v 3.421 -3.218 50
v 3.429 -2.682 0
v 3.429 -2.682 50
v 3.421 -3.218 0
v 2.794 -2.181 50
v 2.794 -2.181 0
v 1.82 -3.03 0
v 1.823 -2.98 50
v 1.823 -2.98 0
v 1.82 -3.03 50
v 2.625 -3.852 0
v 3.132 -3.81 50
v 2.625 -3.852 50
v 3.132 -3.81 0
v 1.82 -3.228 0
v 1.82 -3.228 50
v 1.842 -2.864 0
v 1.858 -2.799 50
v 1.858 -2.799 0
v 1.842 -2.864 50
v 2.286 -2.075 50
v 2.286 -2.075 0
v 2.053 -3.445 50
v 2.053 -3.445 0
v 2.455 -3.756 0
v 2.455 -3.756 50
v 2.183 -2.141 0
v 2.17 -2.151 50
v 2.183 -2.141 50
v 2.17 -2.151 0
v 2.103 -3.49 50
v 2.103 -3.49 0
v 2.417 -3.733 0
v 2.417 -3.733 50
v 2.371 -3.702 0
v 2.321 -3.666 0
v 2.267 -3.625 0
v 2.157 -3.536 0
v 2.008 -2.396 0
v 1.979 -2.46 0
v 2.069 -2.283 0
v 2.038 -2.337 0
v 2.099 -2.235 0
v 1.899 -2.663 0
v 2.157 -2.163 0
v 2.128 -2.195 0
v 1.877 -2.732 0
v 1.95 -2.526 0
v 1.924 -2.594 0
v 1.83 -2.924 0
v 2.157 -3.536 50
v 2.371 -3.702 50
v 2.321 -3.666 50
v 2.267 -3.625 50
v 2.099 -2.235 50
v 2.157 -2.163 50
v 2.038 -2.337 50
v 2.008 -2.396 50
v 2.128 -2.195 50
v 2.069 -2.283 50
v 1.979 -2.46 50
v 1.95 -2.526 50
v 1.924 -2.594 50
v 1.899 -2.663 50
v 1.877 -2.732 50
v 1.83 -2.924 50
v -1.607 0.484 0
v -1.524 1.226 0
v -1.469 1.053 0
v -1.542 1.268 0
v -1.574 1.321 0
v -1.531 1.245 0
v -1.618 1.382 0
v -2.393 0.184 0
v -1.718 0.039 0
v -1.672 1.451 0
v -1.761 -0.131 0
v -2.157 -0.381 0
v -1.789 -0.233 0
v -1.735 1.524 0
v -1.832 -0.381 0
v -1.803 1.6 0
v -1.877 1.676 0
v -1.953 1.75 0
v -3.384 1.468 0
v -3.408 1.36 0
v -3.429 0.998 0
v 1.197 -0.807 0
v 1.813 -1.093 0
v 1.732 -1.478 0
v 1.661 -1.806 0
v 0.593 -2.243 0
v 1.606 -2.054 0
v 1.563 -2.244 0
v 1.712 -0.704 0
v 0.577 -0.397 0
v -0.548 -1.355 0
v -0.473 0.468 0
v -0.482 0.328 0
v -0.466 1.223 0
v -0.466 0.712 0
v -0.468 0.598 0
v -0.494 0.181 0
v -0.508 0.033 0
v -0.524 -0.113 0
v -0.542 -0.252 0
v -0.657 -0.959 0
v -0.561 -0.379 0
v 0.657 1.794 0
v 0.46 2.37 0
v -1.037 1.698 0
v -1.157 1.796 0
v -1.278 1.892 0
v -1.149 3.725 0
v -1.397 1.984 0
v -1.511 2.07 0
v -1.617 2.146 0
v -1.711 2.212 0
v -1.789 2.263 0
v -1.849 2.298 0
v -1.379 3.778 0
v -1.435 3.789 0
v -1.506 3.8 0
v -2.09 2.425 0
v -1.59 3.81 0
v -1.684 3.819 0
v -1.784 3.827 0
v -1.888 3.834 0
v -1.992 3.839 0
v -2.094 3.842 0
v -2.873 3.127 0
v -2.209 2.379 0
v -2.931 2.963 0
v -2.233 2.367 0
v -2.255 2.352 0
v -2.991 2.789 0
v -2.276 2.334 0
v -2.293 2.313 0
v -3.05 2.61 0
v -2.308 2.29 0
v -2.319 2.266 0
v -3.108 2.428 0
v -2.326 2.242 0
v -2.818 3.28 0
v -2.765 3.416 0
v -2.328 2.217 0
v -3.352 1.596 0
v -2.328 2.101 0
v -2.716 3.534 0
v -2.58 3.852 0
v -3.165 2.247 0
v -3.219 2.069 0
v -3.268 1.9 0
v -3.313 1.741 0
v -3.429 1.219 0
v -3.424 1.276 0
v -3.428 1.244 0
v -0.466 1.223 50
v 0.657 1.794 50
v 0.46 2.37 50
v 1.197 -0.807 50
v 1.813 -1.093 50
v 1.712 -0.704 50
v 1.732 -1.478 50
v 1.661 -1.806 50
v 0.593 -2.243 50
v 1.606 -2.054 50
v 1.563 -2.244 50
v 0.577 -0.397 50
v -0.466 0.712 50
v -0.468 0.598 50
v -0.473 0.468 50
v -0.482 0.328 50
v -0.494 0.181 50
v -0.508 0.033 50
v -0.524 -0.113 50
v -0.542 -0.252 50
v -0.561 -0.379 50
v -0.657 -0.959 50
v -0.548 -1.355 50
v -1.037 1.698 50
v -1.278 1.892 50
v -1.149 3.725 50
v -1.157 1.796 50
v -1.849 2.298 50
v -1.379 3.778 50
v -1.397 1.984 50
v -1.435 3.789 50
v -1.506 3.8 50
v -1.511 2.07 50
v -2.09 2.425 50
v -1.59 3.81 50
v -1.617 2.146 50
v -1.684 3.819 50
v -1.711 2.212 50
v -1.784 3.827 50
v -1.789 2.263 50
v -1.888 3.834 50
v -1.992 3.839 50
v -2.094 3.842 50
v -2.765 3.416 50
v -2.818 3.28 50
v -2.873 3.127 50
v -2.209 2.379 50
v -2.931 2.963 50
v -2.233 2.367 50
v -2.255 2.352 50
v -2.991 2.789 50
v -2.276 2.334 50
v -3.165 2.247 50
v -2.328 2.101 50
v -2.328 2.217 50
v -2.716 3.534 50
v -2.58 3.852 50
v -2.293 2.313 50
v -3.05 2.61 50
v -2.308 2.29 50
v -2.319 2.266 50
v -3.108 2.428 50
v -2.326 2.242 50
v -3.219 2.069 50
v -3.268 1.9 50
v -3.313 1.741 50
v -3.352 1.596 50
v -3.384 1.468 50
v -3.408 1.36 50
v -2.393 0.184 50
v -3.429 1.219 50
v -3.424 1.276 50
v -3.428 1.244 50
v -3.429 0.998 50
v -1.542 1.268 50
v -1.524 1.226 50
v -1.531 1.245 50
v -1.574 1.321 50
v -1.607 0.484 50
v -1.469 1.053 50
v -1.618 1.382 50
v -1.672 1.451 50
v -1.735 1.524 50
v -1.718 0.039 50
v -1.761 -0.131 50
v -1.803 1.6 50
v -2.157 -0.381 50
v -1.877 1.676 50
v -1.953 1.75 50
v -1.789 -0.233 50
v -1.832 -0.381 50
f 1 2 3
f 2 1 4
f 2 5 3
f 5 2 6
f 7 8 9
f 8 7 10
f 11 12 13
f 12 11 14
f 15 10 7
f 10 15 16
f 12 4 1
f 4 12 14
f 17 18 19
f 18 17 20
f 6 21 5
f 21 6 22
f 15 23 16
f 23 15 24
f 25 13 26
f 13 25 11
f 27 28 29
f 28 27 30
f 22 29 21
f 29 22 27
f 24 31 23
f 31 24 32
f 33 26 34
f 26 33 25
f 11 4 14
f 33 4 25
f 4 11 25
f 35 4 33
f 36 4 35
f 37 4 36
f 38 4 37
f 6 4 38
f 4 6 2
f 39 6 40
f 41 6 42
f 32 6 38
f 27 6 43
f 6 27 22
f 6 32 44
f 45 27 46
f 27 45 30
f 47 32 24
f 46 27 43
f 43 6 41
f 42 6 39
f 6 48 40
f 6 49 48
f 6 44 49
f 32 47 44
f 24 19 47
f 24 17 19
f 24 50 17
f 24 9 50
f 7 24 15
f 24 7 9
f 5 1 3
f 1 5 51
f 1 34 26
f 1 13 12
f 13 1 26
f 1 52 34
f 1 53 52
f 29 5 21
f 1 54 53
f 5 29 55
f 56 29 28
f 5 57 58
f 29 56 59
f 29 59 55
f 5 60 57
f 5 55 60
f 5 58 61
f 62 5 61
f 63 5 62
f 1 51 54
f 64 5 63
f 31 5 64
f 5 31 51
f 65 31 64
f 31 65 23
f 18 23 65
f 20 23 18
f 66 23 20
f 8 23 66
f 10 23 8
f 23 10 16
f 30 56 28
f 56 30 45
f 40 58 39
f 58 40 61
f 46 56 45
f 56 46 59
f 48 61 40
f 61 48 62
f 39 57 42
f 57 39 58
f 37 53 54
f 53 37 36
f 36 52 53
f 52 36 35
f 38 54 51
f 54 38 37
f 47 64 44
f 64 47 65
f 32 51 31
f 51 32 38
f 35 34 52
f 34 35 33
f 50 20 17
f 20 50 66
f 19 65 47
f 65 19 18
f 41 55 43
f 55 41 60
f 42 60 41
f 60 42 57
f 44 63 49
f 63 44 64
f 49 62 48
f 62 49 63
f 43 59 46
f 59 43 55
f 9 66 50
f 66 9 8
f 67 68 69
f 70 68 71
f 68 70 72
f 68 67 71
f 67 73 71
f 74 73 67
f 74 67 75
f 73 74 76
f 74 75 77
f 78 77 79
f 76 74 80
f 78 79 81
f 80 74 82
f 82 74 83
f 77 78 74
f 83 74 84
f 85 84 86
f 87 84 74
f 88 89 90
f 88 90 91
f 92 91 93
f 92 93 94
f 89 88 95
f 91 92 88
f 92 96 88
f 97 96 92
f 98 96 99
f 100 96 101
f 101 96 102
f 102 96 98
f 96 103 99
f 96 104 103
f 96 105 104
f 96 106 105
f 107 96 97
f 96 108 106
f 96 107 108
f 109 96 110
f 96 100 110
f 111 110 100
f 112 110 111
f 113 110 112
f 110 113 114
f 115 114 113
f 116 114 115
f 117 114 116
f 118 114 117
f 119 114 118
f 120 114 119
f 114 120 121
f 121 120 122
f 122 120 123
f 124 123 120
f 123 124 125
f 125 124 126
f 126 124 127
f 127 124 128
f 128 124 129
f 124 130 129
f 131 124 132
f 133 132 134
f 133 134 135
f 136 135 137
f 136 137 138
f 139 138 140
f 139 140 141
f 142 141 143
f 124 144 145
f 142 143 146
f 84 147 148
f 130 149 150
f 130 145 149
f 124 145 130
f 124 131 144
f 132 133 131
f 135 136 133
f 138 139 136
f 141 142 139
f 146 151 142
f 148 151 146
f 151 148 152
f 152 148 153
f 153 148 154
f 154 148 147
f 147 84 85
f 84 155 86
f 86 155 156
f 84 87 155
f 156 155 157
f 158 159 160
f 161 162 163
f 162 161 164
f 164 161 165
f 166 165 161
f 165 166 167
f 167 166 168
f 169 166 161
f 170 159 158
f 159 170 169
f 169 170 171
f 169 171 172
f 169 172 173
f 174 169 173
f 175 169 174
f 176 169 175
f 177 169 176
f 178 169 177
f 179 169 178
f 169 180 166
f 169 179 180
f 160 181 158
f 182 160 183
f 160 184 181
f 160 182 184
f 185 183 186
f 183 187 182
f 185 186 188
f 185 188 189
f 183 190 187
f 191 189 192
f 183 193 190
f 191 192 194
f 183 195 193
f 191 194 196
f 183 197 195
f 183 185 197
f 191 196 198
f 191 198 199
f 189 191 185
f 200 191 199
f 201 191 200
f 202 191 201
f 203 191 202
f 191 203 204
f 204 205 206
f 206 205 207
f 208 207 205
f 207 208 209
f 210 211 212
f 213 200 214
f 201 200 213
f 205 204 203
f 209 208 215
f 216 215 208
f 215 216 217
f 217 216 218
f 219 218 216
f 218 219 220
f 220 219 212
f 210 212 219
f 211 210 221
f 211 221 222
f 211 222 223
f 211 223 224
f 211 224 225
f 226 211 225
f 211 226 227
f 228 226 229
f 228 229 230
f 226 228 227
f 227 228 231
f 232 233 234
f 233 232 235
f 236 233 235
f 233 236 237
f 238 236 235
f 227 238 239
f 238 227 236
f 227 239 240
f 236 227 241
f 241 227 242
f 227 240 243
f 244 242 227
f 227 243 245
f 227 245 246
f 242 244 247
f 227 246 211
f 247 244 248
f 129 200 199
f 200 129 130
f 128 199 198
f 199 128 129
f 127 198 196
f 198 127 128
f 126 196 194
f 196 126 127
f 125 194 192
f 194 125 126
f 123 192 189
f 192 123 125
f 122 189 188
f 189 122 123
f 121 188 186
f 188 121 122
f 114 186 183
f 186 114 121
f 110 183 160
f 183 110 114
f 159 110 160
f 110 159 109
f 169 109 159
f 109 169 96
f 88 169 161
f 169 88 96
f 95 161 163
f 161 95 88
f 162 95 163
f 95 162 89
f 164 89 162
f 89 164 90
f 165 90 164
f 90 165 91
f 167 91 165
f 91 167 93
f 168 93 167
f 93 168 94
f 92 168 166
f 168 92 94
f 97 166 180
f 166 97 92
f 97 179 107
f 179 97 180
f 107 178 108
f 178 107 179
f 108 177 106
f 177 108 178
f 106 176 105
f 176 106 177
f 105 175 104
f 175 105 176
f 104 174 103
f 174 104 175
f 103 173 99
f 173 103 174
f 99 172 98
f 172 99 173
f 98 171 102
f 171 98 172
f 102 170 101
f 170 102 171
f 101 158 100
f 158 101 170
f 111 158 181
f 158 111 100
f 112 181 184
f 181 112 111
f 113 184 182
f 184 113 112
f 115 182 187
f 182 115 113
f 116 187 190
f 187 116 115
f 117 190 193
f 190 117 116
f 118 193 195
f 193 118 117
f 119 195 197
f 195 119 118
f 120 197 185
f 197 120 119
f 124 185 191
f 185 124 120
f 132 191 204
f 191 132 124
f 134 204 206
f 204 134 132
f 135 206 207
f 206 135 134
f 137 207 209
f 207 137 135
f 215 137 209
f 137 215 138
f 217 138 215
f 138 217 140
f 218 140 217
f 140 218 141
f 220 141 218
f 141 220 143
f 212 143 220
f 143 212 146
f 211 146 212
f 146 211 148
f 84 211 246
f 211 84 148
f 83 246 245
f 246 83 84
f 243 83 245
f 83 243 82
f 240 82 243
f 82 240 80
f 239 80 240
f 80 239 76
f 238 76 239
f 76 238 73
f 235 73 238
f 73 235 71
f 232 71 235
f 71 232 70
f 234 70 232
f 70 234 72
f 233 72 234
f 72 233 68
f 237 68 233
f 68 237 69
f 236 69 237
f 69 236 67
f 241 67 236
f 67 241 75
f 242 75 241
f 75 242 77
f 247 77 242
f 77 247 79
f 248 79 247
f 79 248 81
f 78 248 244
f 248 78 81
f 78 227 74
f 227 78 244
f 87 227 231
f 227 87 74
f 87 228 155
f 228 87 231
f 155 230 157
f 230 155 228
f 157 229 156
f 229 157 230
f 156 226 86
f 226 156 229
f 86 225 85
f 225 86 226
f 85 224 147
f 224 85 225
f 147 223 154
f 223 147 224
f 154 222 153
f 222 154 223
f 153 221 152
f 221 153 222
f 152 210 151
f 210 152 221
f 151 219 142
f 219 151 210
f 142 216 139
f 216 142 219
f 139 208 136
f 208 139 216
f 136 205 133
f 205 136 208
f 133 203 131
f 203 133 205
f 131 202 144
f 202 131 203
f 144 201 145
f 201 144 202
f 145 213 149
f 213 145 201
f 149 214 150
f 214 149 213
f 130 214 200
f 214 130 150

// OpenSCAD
// Generated by inkscape None + inkscape-paths2openscad 0.27
// Sat Sep 26 10:11:22 2020 from "inkscape.svg"

// Module names are of the form poly_<inkscape-path-id>().  As a result,
// you can associate a polygon in this OpenSCAD program with the corresponding
// SVG element in the Inkscape document by looking for the XML element with
// the attribute id="inkscape-path-id".

// fudge value is used to ensure that subtracted solids are a tad taller
// in the z dimension than the polygon being subtracted from.  This helps
// keep the resulting .stl file manifold.
fudge = 0.1;
user_unit_scale_x = 1.0;
user_unit_scale_y = 1.0;
custom_scale_x = 1;
custom_scale_y = 1;
zsize = 50;
line_fn = 16;
min_line_width = 1.0;
line_width_scale = 1.0;
function min_line_mm(w) = max(min_line_width, w * line_width_scale) * 1;


path957_0_center = [2.624667,2.963491];
path957_0_points = [[2.455333,3.756336],[2.416566,3.732715],[2.371214,3.702156],[2.320924,3.665934],[2.267348,3.625328],[2.156934,3.536069],[2.103394,3.489970],[2.053167,3.444596],[1.820333,3.228426],[1.820333,3.029876],[1.822902,2.980118],[1.830301,2.924337],[1.842070,2.863659],[1.857750,2.799210],[1.876880,2.732114],[1.899000,2.663498],[1.923651,2.594487],[1.950372,2.526208],[1.978702,2.459786],[2.008183,2.396346],[2.038353,2.337015],[2.068753,2.282918],[2.098923,2.235180],[2.128403,2.194929],[2.156732,2.163289],[2.170322,2.151050],[2.183451,2.141386],[2.286000,2.075086],[2.540000,2.127986],[2.794000,2.180886],[3.111500,2.431306],[3.429000,2.681716],[3.424900,2.949776],[3.420800,3.217826],[3.276451,3.514156],[3.132103,3.810496],[2.878351,3.831196],[2.624600,3.851896],[2.455266,3.756296],[2.455333,3.756336]];
path957_1_center = [-0.807800,-0.803895];
path957_1_points = [[0.022436,1.798826],[-0.547795,1.355106],[-0.602525,1.156846],[-0.657255,0.958586],[-0.561465,0.378538],[-0.542221,0.251588],[-0.524269,0.112995],[-0.508002,-0.032769],[-0.493811,-0.181227],[-0.482091,-0.327905],[-0.473233,-0.468327],[-0.467630,-0.598020],[-0.465675,-0.712506],[-0.465675,-1.223502],[-1.037175,-1.697695],[-1.156885,-1.795532],[-1.278053,-1.891794],[-1.397346,-1.984019],[-1.511436,-2.069742],[-1.616992,-2.146501],[-1.710683,-2.211831],[-1.789179,-2.263269],[-1.849150,-2.298350],[-2.089625,-2.424812],[-2.208983,-2.379012],[-2.232960,-2.367446],[-2.255329,-2.352084],[-2.275599,-2.333589],[-2.293281,-2.312623],[-2.307885,-2.289851],[-2.318923,-2.265936],[-2.325905,-2.241540],[-2.328341,-2.217326],[-2.328341,-2.101443],[-1.953357,-1.749980],[-1.876912,-1.675853],[-1.803432,-1.599885],[-1.734681,-1.524226],[-1.672422,-1.451025],[-1.618418,-1.382434],[-1.574430,-1.320600],[-1.542223,-1.267676],[-1.531087,-1.245226],[-1.523558,-1.225810],[-1.468738,-1.053105],[-1.607412,-0.484000],[-1.717932,-0.038546],[-1.761344,0.130835],[-1.788917,0.233271],[-1.831747,0.381438],[-1.994236,0.381438],[-2.156728,0.381438],[-2.274938,0.098520],[-2.393149,-0.184397],[-2.911074,-0.591303],[-3.429000,-0.998208],[-3.429000,-1.219198],[-3.427653,-1.244068],[-3.423697,-1.276092],[-3.408461,-1.359966],[-3.384298,-1.467547],[-3.352217,-1.595562],[-3.313224,-1.740740],[-3.268327,-1.899807],[-3.218534,-2.069490],[-3.164852,-2.246517],[-3.108289,-2.427616],[-3.049851,-2.609513],[-2.990547,-2.788936],[-2.931384,-2.962612],[-2.873369,-3.127269],[-2.817509,-3.279633],[-2.764813,-3.416433],[-2.716288,-3.534396],[-2.580061,-3.851896],[-2.094364,-3.841876],[-1.992102,-3.838775],[-1.887623,-3.833771],[-1.783863,-3.827124],[-1.683758,-3.819096],[-1.590244,-3.809946],[-1.506256,-3.799936],[-1.434730,-3.789325],[-1.378602,-3.778376],[-1.148537,-3.724896],[-0.344025,-3.047562],[0.460487,-2.370229],[0.558517,-2.082303],[0.656547,-1.794378],[0.616987,-0.698707],[0.577427,0.396964],[0.887036,0.601853],[1.196645,0.806742],[1.454143,0.755242],[1.711641,0.703742],[1.762521,0.898317],[1.813401,1.092895],[1.731551,1.477995],[1.661025,1.805937],[1.606402,2.053605],[1.563102,2.244105],[1.077882,2.243325],[0.592662,2.242545],[0.022436,1.798826]];
module poly_path957(h, w, s, res=line_fn)
{
  scale([custom_scale_x, -custom_scale_y, 1]) union()
  {
    translate (path957_0_center) linear_extrude(height=h, convexity=10, scale=0.01*s)
      translate (-path957_0_center) polygon(path957_0_points);
    translate (path957_1_center) linear_extrude(height=h, convexity=10, scale=0.01*s)
      translate (-path957_1_center) polygon(path957_1_points);
  }
}

module muddle(h)
{
  difference()
  {
    union()
    {
      translate ([0,0,0]) poly_path957(h, min_line_mm(0.999998), 100.0);
    }
    union()
    {
    }
  }
}

muddle(zsize);
